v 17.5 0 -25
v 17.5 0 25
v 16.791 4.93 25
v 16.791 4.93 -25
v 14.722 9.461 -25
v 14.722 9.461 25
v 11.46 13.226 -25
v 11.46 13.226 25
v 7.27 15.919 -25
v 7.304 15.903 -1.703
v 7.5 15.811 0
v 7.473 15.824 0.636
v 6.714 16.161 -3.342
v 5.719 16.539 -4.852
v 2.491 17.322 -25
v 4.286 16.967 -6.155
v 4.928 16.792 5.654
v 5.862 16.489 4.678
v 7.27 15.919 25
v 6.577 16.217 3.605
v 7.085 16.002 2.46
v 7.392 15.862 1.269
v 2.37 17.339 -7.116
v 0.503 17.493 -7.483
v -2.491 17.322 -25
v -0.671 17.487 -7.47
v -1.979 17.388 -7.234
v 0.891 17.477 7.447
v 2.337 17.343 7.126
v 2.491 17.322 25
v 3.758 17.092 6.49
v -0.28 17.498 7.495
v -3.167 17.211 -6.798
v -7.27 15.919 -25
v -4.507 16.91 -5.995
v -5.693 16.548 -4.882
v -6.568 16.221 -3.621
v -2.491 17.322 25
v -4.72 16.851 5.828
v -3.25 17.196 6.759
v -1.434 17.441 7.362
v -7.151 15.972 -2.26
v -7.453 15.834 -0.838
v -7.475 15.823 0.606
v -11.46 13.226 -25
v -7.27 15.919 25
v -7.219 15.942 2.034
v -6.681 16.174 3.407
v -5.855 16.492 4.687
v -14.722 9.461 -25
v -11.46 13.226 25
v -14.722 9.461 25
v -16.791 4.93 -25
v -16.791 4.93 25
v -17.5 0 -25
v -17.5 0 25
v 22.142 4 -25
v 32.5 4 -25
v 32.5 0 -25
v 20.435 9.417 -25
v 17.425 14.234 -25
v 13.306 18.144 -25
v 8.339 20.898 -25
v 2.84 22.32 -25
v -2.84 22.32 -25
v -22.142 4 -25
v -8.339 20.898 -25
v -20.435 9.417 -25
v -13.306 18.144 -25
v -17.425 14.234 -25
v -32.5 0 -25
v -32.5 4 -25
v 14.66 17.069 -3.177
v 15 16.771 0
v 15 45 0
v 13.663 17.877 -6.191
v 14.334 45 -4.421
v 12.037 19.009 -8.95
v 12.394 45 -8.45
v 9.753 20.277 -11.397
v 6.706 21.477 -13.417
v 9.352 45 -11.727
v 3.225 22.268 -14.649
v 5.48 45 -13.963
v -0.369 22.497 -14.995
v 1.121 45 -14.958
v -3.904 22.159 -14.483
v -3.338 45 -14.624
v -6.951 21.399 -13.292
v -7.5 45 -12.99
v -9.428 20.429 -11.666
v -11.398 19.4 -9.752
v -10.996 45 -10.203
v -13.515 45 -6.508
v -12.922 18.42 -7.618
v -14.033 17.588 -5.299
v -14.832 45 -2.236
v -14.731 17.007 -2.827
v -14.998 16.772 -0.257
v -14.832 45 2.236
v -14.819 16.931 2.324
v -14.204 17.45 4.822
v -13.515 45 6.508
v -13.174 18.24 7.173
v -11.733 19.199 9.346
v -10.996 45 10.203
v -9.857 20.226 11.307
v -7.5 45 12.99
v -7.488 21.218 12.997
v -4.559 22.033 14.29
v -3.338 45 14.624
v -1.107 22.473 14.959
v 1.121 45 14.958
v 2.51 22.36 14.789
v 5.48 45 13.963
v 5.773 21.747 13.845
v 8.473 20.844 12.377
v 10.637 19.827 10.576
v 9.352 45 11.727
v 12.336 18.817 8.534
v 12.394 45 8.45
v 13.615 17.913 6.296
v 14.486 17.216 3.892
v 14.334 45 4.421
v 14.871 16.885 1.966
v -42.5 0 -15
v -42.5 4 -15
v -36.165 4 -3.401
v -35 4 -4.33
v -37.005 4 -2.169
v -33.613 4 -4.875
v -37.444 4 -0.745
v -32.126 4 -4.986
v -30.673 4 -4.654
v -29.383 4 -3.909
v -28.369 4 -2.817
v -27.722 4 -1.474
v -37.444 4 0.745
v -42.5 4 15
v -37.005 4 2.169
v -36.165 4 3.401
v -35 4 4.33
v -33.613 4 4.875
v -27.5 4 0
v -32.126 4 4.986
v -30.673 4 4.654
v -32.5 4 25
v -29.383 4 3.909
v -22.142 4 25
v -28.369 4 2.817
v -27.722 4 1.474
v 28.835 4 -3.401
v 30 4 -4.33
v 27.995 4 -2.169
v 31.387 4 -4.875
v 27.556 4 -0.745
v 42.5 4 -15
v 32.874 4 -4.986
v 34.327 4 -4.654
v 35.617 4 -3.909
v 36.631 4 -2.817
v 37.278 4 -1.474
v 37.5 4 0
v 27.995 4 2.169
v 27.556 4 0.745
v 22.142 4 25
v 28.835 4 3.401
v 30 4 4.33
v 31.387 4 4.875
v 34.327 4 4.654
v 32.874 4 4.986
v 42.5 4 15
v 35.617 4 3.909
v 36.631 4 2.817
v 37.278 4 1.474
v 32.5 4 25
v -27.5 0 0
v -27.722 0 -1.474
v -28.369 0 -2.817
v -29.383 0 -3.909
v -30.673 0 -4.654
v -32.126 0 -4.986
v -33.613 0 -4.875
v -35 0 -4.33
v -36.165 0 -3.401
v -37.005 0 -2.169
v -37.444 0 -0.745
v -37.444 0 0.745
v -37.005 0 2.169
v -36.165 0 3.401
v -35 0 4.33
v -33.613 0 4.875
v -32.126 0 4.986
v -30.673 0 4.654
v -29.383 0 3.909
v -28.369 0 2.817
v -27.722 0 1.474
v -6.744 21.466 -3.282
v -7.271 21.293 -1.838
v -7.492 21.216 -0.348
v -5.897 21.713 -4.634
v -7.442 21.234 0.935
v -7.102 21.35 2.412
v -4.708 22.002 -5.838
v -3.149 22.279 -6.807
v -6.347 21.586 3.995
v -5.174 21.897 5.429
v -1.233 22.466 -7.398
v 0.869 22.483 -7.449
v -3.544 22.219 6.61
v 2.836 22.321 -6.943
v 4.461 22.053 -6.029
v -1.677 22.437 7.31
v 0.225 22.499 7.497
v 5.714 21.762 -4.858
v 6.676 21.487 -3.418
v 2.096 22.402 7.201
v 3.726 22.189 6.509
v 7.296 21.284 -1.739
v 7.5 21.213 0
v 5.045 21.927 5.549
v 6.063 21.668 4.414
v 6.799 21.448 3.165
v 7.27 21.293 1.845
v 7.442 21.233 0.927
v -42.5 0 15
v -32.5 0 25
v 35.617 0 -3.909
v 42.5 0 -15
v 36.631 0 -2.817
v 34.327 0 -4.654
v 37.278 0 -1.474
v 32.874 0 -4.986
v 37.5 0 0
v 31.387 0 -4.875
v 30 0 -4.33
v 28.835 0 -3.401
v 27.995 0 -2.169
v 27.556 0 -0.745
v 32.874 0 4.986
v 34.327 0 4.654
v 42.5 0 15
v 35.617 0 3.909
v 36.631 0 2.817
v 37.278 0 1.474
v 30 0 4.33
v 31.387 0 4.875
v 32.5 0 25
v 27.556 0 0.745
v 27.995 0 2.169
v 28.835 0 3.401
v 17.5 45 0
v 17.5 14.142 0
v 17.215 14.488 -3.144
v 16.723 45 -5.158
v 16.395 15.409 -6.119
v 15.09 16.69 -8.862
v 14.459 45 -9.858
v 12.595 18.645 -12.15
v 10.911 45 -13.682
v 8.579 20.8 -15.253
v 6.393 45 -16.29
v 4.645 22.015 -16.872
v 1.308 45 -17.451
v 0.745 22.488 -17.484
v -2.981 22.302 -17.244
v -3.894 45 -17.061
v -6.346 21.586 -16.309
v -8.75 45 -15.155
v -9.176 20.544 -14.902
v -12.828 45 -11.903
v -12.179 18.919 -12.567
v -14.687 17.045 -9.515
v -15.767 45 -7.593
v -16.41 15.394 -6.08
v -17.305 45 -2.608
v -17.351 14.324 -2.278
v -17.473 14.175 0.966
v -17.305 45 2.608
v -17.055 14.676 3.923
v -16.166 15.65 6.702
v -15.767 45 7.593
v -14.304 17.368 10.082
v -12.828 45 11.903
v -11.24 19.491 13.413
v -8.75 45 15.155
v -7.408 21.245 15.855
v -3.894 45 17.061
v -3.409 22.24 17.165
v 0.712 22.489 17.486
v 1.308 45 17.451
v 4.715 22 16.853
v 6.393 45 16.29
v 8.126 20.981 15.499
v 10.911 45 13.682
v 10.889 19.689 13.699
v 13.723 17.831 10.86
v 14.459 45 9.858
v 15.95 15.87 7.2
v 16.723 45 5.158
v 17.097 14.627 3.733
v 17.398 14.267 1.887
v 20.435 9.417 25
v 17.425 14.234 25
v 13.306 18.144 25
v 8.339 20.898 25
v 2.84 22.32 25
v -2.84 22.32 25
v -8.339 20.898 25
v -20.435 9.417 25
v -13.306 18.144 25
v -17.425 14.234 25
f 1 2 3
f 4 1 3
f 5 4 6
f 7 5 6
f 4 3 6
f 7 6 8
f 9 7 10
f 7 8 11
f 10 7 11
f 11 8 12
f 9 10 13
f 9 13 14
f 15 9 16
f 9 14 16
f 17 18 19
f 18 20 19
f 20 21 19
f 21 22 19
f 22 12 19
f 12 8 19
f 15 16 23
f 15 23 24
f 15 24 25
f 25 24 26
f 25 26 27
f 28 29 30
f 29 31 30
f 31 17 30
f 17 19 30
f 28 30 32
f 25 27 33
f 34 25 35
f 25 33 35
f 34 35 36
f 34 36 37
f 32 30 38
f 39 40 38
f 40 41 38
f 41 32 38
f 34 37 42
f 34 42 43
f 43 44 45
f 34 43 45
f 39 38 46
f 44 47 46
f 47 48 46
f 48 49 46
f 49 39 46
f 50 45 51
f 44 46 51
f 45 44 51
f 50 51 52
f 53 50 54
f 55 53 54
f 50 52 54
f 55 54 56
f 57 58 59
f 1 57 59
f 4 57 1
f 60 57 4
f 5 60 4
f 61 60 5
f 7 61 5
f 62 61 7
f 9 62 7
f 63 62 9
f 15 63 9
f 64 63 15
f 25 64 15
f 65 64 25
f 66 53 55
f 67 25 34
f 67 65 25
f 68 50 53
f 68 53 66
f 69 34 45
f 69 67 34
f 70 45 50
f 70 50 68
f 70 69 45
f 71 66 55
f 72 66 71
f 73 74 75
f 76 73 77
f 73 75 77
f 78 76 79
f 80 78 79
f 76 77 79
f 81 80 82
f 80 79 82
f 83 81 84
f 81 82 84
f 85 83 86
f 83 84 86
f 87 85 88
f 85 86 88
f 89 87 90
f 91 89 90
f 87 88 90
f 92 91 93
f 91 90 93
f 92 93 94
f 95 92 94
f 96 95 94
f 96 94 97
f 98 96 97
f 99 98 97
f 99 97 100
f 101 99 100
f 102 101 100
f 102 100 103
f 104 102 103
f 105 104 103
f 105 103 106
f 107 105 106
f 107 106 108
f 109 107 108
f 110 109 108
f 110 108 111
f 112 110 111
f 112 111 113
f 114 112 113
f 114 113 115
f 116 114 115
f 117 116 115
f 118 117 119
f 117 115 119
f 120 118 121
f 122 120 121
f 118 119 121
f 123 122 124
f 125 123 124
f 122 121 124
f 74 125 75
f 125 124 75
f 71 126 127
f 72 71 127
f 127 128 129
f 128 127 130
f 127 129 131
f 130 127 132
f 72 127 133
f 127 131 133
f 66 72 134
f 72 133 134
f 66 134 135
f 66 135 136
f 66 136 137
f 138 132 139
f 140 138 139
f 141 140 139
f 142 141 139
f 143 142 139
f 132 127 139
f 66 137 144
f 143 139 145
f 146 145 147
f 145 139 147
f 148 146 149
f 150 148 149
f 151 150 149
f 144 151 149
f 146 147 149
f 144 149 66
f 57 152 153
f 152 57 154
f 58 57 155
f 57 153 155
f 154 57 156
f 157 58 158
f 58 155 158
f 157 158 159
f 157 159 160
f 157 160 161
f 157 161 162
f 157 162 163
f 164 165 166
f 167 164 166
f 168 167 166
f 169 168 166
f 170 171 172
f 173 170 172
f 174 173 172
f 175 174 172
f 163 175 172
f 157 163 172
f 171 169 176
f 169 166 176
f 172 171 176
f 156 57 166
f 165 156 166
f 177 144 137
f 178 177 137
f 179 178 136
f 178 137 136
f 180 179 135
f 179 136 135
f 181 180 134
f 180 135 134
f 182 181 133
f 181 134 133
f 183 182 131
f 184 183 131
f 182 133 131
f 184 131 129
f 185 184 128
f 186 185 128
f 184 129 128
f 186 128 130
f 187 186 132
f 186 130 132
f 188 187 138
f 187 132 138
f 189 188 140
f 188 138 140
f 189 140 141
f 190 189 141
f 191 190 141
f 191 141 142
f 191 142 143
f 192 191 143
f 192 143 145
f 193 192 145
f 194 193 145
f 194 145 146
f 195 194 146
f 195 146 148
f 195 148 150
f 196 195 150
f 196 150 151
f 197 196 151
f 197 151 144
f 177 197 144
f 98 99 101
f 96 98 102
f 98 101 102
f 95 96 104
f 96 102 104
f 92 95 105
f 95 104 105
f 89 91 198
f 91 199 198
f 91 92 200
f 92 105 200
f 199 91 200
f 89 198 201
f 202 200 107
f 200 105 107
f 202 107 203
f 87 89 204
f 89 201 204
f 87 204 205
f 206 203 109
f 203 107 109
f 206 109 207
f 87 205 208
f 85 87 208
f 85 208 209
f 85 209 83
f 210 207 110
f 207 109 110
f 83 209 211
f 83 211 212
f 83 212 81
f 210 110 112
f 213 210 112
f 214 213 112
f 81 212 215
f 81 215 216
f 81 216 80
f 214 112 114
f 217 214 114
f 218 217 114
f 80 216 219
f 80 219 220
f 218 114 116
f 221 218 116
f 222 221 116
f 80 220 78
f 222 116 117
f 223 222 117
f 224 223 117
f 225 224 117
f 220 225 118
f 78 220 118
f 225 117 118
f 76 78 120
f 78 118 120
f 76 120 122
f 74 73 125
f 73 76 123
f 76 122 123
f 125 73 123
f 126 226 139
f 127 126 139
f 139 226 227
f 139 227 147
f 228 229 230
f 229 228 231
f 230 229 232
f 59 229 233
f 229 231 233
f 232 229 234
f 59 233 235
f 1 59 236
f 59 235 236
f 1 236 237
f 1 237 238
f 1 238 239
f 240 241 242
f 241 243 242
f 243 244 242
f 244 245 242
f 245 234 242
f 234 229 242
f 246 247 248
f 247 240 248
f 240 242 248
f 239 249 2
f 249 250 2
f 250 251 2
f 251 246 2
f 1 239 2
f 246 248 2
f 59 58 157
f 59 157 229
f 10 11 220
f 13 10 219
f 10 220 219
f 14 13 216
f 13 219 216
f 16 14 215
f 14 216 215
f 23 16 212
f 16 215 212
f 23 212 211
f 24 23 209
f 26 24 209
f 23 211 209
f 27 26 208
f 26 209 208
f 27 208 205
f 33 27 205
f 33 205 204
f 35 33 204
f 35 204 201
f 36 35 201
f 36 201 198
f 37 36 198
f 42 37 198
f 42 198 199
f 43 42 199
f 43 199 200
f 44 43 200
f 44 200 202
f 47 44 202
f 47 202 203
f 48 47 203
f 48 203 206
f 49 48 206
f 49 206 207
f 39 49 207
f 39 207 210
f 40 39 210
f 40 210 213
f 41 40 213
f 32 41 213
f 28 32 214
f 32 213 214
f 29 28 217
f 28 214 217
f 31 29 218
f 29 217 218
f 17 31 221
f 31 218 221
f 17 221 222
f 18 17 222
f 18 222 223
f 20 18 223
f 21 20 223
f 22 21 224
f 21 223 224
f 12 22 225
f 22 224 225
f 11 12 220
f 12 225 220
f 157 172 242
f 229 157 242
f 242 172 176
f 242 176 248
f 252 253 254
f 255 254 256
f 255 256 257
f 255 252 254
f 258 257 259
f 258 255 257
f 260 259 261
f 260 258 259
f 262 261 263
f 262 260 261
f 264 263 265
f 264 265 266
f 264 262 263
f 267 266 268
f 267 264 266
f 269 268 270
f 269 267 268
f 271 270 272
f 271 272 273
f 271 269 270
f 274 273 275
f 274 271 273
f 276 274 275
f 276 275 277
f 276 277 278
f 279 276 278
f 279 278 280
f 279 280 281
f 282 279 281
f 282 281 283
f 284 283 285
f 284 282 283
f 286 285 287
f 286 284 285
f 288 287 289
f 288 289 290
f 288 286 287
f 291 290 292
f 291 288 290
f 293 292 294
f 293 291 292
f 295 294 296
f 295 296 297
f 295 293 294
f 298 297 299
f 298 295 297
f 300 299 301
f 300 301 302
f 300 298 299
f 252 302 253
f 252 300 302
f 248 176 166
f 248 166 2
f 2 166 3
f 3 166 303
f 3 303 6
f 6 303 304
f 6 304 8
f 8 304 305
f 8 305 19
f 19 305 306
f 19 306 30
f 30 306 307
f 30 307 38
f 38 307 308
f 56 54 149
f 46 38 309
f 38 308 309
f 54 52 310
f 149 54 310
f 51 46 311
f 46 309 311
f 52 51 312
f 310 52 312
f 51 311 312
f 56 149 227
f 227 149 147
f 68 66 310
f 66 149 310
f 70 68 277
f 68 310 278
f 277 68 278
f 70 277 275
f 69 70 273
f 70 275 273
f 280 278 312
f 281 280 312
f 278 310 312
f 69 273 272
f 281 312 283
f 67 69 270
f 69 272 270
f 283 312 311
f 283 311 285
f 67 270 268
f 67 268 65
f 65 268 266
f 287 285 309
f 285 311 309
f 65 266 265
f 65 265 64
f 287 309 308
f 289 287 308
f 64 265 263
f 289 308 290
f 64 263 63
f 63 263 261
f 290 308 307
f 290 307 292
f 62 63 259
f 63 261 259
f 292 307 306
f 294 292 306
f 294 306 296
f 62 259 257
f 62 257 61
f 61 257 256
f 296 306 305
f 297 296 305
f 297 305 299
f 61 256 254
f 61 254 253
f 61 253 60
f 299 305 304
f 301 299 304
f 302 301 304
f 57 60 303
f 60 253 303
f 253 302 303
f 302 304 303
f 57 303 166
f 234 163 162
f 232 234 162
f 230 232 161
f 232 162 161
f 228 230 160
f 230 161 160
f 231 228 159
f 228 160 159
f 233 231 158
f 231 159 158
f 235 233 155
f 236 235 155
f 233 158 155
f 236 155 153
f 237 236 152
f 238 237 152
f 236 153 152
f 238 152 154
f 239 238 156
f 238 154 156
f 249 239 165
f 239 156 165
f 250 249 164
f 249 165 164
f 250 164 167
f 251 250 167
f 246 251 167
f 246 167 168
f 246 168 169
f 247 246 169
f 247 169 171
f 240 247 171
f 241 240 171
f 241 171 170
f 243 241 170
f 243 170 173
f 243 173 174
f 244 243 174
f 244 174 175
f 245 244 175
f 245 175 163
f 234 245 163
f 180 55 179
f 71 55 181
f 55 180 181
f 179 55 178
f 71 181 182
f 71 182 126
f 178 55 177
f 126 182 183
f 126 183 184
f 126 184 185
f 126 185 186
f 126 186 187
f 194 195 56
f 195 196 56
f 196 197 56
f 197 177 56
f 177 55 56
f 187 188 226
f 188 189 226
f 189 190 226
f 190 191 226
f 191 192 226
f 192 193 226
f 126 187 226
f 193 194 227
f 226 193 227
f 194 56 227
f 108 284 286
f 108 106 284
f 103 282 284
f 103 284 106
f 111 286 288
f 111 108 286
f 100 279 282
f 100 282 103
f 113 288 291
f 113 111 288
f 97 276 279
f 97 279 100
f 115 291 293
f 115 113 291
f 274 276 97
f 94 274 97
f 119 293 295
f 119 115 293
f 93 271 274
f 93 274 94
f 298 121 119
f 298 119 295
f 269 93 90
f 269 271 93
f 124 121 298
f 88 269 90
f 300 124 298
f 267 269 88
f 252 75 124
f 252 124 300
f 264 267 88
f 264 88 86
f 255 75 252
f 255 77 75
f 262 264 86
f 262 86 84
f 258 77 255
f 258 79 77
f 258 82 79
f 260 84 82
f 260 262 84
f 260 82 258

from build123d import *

# Parameters (mm, degrees)
BOSS_EXTRUDE1_DEPTH = 25
CHAMFER1_SIZE       = 10
SKETCH2_R           = 5
CUT_EXTRUDE1_DEPTH  = 50
BOSS_EXTRUDE2_REACH = 47
SKETCH3_R           = 17.5
SKETCH3_R_2         = 15
SKETCH4_R           = 7.5
CUT_EXTRUDE2_DEPTH  = 50


with BuildPart() as part:
    # Sketch1 → Boss-Extrude1 (new body, symmetric)
    with BuildSketch(Plane.XY):
        with BuildLine():
            Line((-17.5, 0), (-42.5, 0))
            Line((-42.5, 0), (-42.5, 4))
            Line((-42.5, 4), (-22.141589825, 4))
            ThreePointArc((-22.141589825, 4), (0, 22.5), (22.141589825, 4))
            Line((22.141589825, 4), (42.5, 4))
            Line((42.5, 4), (42.5, 0))
            Line((42.5, 0), (17.5, 0))
            ThreePointArc((17.5, 0), (0, 17.5), (-17.5, 0))
        make_face()
    extrude(amount=BOSS_EXTRUDE1_DEPTH, both=True)

    # Chamfer1
    chamfer1_edges = [part.edges().sort_by_distance(p)[0] for p in [
        (-42.5, 2, 25),
        (42.5, 2, 25),
        (42.5, 2, -25),
        (-42.5, 2, -25),
    ]]
    chamfer(chamfer1_edges, length=CHAMFER1_SIZE)

    # Sketch2 → Cut-Extrude1 (cut)
    with BuildSketch(Plane(origin=(0, 4, 0), x_dir=(1, 0, 0), z_dir=(0, 1, 0))):
        with Locations((32.5, 0)):
            Circle(SKETCH2_R)
        with Locations((-32.5, 0)):
            Circle(SKETCH2_R)
    extrude(amount=-CUT_EXTRUDE1_DEPTH, mode=Mode.SUBTRACT)

    # Sketch3 → Boss-Extrude2 (add, up to next)
    with BuildSketch(Plane(origin=(0, 45, 0), x_dir=(1, 0, 0), z_dir=(0, 1, 0)), mode=Mode.PRIVATE) as boss_extrude2_sk1:
        Circle(SKETCH3_R)
        Circle(SKETCH3_R_2, mode=Mode.SUBTRACT)
    boss_extrude2_tool1 = extrude(boss_extrude2_sk1.sketch, amount=-BOSS_EXTRUDE2_REACH, mode=Mode.PRIVATE) - part.part
    add(boss_extrude2_tool1.solids().sort_by_distance((-17.005025, 45, 0))[0])

    # Sketch4 → Cut-Extrude2 (cut)
    with BuildSketch(Plane(origin=(0, 45, 0), x_dir=(1, 0, 0), z_dir=(0, 1, 0))):
        Circle(SKETCH4_R)
    extrude(amount=-CUT_EXTRUDE2_DEPTH, mode=Mode.SUBTRACT)


solid = part.part
